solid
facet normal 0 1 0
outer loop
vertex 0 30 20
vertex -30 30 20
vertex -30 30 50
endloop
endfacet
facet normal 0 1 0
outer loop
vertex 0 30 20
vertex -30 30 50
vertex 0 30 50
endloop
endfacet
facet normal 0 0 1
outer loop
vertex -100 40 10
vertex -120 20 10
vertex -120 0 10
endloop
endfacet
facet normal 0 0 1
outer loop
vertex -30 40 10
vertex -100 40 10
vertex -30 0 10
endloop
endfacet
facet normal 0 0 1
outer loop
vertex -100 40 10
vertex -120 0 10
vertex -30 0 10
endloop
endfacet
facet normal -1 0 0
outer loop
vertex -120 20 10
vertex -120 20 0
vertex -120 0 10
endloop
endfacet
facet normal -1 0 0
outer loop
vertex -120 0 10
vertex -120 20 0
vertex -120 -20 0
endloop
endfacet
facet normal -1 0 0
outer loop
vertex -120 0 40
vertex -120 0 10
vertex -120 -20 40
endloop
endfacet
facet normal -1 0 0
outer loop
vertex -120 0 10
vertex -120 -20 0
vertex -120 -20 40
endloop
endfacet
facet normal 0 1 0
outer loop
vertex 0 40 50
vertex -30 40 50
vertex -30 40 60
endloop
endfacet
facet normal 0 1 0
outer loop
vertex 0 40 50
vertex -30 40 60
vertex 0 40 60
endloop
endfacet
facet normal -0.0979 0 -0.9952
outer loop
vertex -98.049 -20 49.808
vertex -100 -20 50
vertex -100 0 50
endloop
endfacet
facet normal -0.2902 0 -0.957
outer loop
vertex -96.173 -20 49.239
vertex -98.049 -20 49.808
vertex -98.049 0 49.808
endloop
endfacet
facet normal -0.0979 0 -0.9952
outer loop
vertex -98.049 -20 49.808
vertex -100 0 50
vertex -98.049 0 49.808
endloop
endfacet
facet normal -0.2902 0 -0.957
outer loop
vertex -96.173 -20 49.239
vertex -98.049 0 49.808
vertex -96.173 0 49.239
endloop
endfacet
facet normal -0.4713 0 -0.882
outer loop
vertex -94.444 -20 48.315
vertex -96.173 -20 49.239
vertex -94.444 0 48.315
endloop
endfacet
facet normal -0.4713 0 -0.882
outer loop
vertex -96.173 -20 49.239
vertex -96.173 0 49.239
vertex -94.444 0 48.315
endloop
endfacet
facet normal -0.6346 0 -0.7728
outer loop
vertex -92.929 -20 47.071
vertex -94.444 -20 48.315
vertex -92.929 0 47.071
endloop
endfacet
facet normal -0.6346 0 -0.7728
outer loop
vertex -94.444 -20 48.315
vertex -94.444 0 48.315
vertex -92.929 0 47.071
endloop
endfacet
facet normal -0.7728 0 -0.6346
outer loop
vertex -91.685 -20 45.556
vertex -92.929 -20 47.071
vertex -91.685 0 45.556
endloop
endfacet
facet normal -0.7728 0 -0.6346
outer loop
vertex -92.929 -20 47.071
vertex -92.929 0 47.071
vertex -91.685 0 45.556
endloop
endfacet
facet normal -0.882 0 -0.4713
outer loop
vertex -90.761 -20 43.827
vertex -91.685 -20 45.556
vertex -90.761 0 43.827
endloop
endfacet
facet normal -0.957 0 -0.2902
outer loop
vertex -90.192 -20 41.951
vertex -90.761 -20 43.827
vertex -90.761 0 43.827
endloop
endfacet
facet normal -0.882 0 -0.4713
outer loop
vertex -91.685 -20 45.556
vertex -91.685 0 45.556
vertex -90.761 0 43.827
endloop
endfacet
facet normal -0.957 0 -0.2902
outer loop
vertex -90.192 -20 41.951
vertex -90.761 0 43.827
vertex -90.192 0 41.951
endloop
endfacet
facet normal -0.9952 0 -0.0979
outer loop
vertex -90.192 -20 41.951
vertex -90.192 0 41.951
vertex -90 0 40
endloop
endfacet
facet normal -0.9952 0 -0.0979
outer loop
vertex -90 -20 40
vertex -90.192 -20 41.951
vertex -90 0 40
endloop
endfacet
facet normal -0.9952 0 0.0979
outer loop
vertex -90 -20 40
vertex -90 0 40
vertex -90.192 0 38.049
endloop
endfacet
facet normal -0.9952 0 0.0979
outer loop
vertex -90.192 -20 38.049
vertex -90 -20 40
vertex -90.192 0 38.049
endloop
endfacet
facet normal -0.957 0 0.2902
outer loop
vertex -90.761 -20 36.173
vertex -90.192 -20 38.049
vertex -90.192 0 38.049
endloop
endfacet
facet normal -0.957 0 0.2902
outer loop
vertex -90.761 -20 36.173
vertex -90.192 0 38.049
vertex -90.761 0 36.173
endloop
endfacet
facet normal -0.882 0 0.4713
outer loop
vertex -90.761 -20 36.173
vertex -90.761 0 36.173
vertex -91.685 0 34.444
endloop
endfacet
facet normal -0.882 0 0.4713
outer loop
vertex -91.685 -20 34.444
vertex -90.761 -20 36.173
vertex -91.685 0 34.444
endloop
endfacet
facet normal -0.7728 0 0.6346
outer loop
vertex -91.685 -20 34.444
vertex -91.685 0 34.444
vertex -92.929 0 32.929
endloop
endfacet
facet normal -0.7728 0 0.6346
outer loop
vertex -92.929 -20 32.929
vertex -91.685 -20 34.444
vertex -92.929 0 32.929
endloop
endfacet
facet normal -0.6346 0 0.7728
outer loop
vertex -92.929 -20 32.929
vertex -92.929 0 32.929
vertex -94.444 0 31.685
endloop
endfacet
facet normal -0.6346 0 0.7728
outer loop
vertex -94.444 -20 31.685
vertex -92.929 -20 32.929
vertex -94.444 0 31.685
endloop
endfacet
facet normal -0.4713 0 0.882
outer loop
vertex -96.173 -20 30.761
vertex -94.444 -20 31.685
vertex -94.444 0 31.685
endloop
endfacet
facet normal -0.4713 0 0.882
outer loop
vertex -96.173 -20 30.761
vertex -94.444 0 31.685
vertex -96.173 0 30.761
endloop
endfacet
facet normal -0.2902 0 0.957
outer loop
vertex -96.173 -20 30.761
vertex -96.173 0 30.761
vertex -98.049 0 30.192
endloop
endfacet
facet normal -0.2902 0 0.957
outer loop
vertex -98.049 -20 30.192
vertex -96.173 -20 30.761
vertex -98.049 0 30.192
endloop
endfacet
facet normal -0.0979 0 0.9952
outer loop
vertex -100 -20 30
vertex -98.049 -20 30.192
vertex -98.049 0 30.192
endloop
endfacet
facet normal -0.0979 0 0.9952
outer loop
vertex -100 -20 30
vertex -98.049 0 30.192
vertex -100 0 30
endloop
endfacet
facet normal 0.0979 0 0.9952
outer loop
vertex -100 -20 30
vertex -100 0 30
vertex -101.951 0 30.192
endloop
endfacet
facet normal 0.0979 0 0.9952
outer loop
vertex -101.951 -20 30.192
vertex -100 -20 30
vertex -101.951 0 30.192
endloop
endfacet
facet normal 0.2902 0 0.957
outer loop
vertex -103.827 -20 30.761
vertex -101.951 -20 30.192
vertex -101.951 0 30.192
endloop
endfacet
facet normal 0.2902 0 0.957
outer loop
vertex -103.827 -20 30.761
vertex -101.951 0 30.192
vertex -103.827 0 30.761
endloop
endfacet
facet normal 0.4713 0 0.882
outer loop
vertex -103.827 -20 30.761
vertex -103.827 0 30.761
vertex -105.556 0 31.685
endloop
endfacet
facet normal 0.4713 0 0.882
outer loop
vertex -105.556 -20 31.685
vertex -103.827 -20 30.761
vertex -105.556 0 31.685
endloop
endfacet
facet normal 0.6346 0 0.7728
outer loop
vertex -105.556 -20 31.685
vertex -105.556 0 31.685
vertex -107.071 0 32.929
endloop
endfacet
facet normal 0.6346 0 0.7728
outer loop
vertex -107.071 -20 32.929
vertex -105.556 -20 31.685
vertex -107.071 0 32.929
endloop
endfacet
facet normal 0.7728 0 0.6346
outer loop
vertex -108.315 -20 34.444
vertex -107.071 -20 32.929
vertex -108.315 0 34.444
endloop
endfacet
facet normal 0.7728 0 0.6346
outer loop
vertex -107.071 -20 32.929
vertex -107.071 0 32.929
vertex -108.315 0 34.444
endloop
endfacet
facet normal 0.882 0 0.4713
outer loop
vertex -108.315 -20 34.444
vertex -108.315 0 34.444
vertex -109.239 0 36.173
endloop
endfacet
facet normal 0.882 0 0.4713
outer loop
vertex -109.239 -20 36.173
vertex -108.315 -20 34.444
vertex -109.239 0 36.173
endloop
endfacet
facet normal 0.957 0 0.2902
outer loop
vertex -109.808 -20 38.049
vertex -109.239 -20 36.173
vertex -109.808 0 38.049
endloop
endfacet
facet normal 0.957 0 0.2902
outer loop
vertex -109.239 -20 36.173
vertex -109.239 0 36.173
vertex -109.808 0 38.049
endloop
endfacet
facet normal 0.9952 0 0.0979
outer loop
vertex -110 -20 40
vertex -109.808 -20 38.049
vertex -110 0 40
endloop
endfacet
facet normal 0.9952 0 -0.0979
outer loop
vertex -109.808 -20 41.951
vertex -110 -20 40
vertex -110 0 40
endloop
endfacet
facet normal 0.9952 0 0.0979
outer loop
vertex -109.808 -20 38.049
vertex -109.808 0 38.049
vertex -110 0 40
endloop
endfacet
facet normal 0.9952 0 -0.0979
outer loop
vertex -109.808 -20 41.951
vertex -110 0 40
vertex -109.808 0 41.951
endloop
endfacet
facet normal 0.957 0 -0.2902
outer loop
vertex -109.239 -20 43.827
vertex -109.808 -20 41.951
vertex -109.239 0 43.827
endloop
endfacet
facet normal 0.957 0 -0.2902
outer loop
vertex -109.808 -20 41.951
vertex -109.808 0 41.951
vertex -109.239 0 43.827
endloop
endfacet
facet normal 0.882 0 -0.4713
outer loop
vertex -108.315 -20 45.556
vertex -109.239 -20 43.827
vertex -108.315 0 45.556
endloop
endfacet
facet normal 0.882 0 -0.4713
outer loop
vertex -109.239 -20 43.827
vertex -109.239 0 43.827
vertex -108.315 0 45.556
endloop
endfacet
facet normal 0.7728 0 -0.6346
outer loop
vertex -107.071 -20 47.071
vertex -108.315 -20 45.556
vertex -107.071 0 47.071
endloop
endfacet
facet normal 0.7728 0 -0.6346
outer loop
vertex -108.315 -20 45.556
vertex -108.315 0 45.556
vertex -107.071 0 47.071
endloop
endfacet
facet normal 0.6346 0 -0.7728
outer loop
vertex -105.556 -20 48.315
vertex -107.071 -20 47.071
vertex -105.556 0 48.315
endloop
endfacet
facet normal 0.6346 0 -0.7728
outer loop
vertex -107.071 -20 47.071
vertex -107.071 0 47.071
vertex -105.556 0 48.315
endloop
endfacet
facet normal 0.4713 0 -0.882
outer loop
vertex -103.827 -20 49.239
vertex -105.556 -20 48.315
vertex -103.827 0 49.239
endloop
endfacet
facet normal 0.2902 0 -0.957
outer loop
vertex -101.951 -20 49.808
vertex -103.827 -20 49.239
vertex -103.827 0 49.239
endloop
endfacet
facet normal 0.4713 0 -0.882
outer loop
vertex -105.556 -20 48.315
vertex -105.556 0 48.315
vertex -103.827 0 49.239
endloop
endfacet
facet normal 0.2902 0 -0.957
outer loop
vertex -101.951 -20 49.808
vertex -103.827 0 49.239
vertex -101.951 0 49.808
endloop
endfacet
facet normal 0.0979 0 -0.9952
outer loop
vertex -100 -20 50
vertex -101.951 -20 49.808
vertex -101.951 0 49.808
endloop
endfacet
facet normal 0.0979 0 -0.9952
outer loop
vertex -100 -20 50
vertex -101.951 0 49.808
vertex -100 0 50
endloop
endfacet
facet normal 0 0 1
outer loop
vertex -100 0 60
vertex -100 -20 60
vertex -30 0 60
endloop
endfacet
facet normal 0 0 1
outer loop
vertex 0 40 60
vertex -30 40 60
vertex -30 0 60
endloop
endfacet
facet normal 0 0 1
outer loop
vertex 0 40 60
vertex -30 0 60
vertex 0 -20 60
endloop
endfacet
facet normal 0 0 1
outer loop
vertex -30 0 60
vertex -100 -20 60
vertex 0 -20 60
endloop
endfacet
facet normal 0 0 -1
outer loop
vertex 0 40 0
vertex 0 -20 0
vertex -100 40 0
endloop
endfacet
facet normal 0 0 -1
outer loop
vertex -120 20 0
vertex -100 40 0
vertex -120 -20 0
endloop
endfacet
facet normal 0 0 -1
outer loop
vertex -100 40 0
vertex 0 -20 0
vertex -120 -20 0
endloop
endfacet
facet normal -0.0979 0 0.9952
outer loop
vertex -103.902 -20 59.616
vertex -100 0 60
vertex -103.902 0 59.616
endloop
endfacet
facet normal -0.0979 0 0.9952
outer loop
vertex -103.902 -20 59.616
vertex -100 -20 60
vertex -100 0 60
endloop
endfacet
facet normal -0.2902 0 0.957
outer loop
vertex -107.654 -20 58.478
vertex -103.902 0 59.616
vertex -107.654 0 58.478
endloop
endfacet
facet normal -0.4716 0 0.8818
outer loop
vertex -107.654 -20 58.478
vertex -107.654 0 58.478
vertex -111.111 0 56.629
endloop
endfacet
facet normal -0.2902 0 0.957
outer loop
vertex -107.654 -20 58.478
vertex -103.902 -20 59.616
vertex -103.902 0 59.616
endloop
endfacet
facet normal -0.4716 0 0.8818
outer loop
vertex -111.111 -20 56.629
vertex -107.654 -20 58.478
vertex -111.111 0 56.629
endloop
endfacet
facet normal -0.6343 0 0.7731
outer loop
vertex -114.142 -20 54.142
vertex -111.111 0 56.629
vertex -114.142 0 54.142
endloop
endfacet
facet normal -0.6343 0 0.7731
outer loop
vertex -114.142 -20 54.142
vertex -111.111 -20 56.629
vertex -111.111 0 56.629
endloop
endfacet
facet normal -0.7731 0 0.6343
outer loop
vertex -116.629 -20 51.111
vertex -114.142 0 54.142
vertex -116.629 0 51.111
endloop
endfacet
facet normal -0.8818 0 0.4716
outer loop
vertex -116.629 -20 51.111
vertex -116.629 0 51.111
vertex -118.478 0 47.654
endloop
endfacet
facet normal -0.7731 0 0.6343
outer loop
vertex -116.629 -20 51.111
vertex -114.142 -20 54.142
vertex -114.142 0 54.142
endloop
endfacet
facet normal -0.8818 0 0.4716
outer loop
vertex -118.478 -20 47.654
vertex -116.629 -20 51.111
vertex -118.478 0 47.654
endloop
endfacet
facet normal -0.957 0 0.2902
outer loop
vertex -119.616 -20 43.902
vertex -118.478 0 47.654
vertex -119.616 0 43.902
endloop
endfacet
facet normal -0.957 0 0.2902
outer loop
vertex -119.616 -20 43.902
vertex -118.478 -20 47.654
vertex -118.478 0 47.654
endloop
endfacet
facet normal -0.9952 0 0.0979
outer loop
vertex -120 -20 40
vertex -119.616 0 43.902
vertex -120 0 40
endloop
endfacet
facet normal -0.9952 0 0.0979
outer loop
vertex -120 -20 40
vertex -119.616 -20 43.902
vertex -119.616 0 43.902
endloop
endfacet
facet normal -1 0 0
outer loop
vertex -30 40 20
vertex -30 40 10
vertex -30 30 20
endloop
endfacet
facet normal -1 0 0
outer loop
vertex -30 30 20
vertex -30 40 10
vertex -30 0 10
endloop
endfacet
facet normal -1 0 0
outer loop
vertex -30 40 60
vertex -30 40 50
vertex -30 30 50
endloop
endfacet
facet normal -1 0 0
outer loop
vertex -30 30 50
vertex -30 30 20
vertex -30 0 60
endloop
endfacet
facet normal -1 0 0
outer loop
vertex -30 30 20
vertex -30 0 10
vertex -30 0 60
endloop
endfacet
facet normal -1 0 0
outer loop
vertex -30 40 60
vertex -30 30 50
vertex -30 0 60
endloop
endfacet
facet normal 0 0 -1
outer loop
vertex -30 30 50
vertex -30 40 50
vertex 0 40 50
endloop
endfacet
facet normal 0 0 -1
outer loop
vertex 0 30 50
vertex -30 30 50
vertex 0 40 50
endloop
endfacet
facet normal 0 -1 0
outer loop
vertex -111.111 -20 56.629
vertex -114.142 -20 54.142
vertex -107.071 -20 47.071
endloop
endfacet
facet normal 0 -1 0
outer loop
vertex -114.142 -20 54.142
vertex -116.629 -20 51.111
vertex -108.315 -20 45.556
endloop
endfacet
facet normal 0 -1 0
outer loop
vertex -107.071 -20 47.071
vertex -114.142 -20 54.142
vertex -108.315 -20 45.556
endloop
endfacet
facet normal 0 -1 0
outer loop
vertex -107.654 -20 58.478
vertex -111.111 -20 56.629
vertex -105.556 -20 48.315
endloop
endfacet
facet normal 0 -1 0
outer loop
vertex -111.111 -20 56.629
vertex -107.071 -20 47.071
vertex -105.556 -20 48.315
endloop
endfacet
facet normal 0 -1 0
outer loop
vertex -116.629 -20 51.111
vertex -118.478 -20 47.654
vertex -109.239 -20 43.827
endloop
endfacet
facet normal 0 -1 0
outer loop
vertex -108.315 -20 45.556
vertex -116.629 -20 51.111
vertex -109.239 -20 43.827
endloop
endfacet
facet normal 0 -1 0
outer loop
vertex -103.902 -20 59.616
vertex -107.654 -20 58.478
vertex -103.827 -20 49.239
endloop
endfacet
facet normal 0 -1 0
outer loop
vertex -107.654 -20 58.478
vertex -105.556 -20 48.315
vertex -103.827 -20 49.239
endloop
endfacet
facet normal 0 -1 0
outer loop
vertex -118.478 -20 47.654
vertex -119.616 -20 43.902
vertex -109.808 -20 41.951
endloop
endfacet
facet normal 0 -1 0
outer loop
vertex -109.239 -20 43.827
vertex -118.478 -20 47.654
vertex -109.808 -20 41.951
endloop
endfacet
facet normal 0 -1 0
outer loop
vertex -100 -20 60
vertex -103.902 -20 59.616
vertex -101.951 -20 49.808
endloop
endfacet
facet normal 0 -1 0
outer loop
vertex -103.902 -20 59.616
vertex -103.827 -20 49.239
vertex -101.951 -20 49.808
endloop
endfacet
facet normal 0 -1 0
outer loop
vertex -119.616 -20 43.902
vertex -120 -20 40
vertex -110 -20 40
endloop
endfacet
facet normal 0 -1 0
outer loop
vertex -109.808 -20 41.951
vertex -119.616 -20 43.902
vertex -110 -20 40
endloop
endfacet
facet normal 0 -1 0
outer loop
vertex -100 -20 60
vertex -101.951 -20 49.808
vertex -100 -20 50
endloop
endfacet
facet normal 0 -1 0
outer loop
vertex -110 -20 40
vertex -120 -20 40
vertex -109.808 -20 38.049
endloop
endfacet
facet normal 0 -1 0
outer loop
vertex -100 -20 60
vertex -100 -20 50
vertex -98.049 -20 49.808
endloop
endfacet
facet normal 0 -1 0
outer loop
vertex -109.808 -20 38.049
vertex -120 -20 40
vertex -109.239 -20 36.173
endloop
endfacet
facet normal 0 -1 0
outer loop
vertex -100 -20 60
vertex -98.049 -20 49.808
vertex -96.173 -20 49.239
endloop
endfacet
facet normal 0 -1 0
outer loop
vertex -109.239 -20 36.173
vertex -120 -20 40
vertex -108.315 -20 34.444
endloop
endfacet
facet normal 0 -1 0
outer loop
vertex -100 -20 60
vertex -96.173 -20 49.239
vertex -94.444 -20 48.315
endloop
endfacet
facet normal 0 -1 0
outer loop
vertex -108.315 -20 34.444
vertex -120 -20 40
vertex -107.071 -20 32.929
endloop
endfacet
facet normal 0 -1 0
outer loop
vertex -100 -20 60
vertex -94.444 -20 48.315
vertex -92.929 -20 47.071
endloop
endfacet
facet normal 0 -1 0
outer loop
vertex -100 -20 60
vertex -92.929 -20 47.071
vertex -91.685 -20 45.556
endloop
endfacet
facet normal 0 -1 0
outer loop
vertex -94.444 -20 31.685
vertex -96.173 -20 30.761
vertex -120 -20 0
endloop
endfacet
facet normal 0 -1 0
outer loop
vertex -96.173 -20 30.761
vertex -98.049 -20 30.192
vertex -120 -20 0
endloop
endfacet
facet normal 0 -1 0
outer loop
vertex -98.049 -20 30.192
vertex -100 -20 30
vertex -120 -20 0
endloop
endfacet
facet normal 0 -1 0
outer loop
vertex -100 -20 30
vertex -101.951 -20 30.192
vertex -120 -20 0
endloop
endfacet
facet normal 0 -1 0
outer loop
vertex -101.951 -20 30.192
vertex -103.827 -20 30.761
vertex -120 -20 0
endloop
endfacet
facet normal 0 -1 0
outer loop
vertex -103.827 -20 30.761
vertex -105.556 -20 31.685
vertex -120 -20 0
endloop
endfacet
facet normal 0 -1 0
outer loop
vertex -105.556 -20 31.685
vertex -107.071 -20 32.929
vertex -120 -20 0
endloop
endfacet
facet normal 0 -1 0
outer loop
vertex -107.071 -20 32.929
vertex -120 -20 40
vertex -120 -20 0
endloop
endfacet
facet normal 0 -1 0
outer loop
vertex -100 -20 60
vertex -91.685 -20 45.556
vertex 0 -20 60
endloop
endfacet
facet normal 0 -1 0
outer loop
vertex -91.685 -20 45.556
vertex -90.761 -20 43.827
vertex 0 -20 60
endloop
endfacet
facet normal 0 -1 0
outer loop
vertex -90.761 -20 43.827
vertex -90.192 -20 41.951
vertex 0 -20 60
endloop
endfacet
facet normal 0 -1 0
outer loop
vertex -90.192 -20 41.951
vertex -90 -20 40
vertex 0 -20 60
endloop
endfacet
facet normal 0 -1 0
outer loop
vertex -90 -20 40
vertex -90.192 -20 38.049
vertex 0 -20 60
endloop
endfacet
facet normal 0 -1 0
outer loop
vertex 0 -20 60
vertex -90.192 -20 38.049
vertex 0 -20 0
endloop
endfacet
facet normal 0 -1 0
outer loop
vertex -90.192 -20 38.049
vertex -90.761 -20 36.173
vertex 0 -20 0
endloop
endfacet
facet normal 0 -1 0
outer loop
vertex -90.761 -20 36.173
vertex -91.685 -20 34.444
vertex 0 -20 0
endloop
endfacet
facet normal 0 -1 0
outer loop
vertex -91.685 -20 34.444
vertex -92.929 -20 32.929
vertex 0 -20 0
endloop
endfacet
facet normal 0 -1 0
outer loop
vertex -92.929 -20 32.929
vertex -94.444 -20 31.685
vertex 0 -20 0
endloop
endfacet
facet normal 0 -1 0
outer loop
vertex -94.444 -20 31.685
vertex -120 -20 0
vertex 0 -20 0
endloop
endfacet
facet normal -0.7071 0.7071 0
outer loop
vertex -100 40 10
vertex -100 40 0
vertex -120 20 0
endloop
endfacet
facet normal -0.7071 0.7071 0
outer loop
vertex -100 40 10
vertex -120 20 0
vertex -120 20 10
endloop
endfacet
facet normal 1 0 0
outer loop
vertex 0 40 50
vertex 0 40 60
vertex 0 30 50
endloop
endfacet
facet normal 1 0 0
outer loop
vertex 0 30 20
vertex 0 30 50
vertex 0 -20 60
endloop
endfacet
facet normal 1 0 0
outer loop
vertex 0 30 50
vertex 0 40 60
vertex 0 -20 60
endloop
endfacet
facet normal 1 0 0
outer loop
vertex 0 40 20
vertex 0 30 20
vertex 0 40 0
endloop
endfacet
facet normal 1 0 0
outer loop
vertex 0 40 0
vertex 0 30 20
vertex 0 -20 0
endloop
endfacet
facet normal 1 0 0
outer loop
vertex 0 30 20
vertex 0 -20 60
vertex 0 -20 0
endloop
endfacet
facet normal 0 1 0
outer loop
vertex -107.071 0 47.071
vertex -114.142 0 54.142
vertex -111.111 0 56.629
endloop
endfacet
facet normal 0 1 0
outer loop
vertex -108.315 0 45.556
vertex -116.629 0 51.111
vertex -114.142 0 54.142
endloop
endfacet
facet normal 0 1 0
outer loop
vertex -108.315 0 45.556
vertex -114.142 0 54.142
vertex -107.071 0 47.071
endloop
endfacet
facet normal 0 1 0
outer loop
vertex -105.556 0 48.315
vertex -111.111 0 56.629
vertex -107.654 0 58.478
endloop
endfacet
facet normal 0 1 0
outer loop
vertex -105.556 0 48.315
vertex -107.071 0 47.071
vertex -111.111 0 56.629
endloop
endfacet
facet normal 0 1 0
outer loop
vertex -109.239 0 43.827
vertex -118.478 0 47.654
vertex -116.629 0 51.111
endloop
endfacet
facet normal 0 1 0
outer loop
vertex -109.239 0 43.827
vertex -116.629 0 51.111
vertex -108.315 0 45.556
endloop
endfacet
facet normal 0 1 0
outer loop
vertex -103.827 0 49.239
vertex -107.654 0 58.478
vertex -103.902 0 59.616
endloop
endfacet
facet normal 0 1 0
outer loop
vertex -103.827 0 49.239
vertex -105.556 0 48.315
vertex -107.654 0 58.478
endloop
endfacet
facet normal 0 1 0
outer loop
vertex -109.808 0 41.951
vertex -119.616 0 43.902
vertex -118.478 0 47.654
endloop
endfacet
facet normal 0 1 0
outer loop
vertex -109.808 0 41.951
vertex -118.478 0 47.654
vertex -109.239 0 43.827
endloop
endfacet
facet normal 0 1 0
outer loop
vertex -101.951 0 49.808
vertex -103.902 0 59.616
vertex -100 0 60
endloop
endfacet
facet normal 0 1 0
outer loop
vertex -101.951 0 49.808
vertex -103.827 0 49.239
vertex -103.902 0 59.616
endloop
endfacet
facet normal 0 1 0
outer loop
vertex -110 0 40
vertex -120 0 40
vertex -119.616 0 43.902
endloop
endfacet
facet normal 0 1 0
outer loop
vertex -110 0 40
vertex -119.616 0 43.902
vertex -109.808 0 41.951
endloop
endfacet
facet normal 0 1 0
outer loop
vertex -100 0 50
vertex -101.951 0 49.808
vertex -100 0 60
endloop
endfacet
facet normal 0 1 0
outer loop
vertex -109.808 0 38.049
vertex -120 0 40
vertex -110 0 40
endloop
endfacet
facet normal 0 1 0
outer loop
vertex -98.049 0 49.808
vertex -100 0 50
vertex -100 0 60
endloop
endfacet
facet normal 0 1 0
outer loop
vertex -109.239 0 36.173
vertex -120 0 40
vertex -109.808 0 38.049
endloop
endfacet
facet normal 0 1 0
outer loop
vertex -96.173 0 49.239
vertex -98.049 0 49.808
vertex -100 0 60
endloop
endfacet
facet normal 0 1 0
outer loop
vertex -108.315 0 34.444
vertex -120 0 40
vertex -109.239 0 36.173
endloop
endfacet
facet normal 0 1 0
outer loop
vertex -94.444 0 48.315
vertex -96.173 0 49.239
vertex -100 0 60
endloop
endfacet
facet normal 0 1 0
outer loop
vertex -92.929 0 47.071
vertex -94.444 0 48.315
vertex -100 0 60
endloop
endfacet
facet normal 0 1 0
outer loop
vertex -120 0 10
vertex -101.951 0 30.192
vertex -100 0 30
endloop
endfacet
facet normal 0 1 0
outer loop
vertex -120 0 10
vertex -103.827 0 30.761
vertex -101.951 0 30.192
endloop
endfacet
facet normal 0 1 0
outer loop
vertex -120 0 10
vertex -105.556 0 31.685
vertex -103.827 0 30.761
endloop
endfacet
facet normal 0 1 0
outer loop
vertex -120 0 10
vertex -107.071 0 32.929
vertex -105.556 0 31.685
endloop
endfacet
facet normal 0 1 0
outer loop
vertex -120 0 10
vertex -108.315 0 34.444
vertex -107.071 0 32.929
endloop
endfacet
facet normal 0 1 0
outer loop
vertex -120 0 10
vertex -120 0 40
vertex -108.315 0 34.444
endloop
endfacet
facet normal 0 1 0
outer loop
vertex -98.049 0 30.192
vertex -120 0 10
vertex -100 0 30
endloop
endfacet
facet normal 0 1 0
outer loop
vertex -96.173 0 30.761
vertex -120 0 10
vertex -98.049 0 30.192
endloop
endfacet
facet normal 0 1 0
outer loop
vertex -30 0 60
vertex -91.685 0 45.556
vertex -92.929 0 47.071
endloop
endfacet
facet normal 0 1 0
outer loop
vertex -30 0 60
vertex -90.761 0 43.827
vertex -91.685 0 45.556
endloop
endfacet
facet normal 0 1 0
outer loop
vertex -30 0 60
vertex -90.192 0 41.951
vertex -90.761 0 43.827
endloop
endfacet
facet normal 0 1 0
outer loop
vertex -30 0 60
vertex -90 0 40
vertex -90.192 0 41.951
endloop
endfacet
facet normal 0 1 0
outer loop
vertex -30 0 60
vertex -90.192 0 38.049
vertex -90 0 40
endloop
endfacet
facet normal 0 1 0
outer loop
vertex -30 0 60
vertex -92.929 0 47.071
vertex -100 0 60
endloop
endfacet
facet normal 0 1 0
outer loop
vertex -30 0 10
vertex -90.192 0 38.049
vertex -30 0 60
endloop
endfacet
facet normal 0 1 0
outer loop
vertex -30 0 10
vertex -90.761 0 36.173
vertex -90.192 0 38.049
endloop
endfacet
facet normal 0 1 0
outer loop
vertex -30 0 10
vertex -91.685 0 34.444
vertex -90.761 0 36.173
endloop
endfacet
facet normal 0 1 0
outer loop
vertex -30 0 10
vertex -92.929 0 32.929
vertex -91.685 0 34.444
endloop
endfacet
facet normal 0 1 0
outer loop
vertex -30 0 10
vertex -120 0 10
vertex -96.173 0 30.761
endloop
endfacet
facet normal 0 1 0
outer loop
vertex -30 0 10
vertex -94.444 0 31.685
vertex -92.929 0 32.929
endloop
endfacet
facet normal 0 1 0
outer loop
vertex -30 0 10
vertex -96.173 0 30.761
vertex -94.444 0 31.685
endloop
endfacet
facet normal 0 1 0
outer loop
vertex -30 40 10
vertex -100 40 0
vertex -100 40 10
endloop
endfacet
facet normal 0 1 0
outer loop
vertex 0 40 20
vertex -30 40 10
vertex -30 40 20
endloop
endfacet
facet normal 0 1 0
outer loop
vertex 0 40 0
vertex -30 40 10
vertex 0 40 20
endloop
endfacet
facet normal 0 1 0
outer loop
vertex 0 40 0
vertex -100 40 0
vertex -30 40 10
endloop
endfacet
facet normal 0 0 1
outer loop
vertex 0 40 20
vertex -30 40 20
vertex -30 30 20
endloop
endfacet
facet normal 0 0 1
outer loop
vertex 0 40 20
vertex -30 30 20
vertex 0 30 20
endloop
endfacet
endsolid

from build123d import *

# Parameters (mm, degrees)
SKETCH2_W           = 120
SKETCH2_H           = 60
BOSS_EXTRUDE1_DEPTH = 20
BOSS_EXTRUDE2_DEPTH = 40
FILLET1_R           = 20
CHAMFER1_SIZE       = 20
SKETCH8_W           = 30
SKETCH8_H           = 30
CUT_EXTRUDE1_DEPTH  = 10
SKETCH11_R          = 10
CUT_EXTRUDE3_DEPTH  = 141


with BuildPart() as part:
    # Sketch2 → Boss-Extrude1 (new body)
    with BuildSketch(Plane(origin=(0, 0, 0), x_dir=(1, 0, 0), z_dir=(0, 1, 0))):
        with Locations((-60, -30)):
            Rectangle(SKETCH2_W, SKETCH2_H)
    extrude(amount=-BOSS_EXTRUDE1_DEPTH)

    # Sketch3 → Boss-Extrude2 (add)
    with BuildSketch(Plane(origin=(0, 0, 0), x_dir=(1, 0, 0), z_dir=(0, 1, 0))):
        Polygon((-120, -10), (-30, -10), (-30, -60), (0, -60), (0, 0), (-120, 0), align=None)
    extrude(amount=BOSS_EXTRUDE2_DEPTH)

    # Fillet1
    fillet1_edges = [part.edges().sort_by_distance(p)[0] for p in [
        (-120, -10, 60),
    ]]
    fillet(fillet1_edges, radius=FILLET1_R)

    # Chamfer1
    chamfer1_edges = [part.edges().sort_by_distance(p)[0] for p in [
        (-120, 40, 5),
    ]]
    chamfer(chamfer1_edges, length=CHAMFER1_SIZE)

    # Sketch8 → Cut-Extrude1 (cut)
    with BuildSketch(Plane(origin=(0, 40, 0), x_dir=(1, 0, 0), z_dir=(0, 1, 0))):
        with Locations((-15, -35)):
            Rectangle(SKETCH8_W, SKETCH8_H)
    extrude(amount=-CUT_EXTRUDE1_DEPTH, mode=Mode.SUBTRACT)

    # Sketch11 → Cut-Extrude3 (cut, through all)
    with BuildSketch(Plane(origin=(0, 0, 0), x_dir=(1, 0, 0), z_dir=(0, 1, 0))):
        with Locations(Location((-100, -40, 0), (0, 0, 270))):
            Circle(SKETCH11_R)
    extrude(amount=-CUT_EXTRUDE3_DEPTH, mode=Mode.SUBTRACT)


solid = part.part
